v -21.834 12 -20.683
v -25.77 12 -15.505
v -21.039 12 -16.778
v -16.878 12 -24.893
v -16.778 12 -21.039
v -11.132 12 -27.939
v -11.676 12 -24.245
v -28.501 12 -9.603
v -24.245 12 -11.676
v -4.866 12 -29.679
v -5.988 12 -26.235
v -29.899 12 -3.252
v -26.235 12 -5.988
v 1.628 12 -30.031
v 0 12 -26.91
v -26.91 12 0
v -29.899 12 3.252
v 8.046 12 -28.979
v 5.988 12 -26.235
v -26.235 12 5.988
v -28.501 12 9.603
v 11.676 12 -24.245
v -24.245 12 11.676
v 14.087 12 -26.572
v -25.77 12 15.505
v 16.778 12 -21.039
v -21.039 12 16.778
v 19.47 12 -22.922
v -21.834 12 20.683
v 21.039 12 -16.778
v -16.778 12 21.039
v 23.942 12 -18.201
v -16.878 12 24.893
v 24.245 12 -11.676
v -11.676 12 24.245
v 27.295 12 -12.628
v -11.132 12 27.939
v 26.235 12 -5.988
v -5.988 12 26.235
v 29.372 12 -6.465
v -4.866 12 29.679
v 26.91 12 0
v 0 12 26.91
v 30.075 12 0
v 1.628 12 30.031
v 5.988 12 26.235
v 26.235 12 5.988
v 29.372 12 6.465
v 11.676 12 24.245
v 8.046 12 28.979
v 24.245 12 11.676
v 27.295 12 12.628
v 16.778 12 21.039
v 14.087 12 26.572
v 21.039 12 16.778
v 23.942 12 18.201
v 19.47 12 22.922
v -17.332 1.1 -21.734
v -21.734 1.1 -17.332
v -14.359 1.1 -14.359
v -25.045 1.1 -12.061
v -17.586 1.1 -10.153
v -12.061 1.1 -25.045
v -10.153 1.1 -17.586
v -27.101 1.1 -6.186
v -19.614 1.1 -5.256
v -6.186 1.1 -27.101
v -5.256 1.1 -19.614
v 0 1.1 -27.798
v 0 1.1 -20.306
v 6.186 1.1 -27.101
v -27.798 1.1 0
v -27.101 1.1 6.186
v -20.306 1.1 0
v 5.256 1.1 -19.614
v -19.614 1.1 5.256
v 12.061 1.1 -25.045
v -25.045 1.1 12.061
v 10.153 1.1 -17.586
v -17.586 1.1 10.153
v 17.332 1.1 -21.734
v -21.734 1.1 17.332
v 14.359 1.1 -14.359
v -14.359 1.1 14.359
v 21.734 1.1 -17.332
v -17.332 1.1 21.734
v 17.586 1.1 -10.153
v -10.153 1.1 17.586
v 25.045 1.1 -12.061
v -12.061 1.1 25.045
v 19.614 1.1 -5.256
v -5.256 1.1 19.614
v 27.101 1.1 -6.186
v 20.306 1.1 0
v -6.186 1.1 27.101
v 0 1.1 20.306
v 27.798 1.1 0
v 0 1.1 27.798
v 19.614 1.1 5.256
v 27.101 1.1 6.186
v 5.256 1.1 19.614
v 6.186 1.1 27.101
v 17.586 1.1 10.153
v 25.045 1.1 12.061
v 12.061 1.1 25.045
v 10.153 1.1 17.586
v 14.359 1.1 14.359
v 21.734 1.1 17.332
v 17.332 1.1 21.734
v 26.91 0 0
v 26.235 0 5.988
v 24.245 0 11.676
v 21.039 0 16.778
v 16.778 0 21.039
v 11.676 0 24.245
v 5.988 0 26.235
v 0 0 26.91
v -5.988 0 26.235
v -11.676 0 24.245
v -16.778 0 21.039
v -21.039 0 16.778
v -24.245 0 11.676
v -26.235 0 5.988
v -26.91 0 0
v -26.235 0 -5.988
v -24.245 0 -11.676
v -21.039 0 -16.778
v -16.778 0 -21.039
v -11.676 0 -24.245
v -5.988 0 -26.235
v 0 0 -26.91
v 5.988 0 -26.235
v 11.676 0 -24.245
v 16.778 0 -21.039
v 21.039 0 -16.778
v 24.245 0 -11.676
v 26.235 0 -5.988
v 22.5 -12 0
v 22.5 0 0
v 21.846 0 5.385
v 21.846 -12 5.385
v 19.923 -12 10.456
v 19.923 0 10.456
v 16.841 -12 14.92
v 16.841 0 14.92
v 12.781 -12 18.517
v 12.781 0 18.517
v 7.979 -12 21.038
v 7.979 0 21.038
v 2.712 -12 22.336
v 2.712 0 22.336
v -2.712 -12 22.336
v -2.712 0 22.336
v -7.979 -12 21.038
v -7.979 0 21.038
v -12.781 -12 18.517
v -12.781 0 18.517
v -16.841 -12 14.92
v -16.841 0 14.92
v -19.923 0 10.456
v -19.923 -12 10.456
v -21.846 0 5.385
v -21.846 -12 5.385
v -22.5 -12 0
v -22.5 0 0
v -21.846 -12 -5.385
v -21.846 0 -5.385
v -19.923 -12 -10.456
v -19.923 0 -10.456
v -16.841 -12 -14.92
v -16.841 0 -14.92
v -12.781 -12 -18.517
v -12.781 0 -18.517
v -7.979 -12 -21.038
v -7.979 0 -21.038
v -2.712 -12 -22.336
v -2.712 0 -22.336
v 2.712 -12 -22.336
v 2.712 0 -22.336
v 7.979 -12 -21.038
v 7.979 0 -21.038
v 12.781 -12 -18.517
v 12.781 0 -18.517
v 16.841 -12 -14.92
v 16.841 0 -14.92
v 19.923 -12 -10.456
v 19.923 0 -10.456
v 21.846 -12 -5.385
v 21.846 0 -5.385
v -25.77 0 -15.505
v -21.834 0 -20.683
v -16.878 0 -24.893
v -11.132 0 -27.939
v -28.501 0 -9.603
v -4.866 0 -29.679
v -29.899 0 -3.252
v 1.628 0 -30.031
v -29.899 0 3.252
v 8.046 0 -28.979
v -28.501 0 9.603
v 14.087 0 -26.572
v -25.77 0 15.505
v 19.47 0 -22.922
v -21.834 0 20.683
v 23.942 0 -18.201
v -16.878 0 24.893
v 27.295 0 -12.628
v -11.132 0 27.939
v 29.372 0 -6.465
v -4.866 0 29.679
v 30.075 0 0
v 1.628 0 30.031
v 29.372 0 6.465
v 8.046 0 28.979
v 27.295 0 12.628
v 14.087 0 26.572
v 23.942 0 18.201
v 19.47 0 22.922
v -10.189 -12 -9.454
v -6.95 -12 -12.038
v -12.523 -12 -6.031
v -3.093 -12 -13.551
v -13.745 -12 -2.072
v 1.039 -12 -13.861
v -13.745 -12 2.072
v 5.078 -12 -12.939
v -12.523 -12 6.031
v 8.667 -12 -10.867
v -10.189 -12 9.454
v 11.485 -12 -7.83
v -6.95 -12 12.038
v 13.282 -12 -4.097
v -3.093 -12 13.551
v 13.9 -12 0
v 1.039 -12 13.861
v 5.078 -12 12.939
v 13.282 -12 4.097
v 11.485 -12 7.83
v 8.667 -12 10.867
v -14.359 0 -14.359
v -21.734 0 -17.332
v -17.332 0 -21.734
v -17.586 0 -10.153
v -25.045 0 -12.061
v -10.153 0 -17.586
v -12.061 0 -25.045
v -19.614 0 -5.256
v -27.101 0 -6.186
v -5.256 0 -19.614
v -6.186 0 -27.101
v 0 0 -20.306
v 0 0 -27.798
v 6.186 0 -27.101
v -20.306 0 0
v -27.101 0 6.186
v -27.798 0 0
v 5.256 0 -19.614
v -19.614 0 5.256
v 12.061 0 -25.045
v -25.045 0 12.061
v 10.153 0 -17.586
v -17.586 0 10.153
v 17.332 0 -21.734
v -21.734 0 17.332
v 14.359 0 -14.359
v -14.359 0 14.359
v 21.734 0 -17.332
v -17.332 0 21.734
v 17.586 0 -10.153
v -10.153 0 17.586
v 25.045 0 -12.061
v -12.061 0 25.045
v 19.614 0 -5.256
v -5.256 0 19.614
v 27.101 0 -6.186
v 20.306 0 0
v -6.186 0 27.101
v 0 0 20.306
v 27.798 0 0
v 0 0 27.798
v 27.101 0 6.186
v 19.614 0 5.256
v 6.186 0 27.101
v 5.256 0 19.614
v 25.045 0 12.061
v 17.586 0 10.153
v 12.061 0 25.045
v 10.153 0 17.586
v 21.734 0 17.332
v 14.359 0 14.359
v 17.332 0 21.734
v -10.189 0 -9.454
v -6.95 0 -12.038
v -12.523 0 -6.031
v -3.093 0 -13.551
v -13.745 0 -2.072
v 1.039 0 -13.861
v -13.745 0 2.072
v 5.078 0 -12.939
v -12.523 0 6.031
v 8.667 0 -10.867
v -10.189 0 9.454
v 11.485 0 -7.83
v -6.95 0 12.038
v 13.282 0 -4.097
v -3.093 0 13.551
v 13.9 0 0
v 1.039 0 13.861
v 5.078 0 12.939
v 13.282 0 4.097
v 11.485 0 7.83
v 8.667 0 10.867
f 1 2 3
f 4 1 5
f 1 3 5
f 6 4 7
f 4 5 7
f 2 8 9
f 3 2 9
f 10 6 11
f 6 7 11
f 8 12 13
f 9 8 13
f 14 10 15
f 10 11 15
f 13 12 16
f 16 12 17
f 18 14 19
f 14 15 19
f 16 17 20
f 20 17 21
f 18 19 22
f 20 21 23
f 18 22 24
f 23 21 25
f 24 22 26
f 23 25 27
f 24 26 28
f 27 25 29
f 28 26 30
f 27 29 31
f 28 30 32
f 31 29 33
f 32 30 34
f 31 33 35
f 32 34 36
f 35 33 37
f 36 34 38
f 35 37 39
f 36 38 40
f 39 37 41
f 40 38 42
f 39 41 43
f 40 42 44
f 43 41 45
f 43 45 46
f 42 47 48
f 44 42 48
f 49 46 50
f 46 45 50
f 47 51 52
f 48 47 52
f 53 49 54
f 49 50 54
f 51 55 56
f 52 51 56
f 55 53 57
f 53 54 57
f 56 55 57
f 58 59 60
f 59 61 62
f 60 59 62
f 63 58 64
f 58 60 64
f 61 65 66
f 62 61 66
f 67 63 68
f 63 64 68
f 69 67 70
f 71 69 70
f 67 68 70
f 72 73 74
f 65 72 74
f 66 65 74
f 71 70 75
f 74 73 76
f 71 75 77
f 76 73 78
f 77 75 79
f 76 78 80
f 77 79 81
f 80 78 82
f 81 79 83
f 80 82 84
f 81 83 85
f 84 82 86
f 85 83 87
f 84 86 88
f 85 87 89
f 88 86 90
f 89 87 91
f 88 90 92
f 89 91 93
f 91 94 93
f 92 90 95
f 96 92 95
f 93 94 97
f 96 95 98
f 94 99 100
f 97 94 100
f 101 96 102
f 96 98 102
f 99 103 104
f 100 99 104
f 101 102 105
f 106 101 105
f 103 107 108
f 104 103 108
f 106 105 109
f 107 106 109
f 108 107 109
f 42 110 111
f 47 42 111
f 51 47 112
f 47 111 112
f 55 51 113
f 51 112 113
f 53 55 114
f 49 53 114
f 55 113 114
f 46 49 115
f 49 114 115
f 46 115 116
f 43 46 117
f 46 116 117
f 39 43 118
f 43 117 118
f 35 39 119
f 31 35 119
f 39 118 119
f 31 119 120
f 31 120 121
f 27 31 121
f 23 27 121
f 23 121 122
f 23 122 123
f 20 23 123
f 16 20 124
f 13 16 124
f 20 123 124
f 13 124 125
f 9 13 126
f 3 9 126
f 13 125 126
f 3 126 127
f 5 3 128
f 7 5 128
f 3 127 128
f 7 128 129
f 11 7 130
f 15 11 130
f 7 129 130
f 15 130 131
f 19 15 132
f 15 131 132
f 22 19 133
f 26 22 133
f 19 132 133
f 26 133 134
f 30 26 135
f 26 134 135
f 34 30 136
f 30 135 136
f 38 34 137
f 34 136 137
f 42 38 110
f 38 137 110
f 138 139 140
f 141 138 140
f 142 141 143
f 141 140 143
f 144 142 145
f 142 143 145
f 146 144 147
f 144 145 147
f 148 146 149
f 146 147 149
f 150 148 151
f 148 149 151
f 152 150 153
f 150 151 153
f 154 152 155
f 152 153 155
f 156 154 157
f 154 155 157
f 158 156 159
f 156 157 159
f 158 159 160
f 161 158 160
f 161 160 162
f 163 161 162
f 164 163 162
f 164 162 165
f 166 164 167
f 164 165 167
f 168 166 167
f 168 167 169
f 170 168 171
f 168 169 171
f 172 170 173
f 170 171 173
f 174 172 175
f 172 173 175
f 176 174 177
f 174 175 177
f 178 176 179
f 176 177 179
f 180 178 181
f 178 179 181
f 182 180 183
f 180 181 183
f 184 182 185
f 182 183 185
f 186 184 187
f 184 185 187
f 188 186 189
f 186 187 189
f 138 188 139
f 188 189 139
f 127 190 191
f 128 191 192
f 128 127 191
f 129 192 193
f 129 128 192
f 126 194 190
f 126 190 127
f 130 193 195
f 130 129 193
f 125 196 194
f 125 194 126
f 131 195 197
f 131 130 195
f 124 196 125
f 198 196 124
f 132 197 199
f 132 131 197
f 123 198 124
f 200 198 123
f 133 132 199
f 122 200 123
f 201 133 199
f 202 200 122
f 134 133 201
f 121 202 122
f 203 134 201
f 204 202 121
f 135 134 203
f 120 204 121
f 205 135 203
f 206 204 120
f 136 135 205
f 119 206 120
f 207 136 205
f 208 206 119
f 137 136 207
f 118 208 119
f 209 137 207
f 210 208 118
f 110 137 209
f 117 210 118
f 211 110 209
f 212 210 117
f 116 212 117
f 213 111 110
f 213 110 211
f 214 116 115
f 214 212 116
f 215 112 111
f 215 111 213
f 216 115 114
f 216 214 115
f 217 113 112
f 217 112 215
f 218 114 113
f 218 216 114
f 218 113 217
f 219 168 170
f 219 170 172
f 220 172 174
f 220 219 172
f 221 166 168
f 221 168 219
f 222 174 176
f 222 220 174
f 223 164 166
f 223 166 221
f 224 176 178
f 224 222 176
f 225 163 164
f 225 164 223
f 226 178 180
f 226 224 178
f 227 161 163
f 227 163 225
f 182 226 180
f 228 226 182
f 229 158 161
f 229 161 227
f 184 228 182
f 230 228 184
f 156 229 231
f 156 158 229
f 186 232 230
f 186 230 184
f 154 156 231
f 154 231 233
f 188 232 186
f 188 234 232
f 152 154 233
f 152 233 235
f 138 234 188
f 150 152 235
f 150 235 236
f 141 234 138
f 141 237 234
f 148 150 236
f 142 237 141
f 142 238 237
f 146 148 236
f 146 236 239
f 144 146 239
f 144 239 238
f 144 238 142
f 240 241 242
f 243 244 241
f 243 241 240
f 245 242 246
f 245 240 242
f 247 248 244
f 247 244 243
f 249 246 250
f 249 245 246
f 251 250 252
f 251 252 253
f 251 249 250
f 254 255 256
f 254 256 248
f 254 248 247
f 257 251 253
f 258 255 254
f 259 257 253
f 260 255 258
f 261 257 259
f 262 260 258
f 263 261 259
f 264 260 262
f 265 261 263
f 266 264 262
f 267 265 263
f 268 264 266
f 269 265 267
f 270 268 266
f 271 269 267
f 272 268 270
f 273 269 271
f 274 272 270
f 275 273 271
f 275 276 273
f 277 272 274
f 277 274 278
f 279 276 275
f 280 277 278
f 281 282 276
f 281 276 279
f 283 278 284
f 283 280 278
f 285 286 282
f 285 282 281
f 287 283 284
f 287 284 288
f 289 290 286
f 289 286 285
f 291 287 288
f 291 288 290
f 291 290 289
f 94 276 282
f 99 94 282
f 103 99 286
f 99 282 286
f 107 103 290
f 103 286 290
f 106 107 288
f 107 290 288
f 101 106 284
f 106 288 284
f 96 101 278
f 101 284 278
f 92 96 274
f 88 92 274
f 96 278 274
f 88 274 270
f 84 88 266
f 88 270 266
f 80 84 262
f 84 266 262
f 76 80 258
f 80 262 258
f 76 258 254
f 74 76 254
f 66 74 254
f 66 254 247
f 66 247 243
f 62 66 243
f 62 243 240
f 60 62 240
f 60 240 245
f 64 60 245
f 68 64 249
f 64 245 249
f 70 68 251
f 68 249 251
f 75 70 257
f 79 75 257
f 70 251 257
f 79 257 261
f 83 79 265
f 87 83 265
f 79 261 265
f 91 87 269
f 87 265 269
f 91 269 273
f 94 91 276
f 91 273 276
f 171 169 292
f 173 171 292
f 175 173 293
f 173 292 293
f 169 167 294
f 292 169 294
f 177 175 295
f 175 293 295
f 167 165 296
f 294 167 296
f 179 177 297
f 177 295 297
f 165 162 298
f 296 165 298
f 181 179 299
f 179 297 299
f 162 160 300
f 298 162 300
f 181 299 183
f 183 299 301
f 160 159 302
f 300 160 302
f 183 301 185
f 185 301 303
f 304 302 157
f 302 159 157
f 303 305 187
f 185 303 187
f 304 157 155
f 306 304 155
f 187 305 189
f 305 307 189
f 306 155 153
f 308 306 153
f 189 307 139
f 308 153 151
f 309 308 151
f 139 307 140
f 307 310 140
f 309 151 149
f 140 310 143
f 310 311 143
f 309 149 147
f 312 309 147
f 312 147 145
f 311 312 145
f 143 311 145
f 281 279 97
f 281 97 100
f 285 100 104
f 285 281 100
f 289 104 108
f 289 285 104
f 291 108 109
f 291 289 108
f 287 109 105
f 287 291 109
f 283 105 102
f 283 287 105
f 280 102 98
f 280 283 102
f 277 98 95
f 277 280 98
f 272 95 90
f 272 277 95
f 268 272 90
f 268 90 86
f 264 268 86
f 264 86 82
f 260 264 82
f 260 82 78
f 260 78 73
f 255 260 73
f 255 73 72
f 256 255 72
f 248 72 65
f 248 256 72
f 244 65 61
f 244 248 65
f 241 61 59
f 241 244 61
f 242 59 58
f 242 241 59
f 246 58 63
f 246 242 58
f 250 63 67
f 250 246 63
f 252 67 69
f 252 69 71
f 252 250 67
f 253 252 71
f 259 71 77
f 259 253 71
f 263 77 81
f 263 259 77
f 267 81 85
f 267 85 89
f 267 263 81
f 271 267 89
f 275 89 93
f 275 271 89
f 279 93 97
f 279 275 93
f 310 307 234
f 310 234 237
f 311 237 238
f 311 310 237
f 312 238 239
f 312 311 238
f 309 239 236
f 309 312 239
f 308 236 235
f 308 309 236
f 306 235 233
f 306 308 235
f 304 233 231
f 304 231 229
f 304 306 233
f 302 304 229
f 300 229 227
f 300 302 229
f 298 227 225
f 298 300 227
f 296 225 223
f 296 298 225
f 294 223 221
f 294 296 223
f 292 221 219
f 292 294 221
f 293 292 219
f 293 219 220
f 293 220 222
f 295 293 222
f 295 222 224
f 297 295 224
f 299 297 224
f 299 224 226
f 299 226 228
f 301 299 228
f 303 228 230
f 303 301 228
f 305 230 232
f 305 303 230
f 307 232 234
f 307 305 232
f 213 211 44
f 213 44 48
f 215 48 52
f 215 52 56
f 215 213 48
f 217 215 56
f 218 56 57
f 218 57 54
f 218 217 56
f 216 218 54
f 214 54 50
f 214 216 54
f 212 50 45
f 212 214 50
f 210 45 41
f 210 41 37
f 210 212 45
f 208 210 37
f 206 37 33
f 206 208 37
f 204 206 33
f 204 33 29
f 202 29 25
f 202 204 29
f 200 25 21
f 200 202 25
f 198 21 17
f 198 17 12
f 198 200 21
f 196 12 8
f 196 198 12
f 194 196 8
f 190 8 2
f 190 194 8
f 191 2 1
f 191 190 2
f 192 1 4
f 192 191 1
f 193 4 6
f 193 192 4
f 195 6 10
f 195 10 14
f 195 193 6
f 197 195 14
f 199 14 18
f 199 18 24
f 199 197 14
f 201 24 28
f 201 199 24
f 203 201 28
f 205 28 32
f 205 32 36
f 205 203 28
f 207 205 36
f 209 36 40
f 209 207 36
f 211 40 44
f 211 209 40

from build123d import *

# Parameters (mm, degrees)
F0_R     = 22.5
F0_R_2   = 13.9
F1_DEPTH = 12
F2_R     = 30.075
F2_R_2   = 26.91
F3_DEPTH = 12
F4_R     = 27.798297
F4_R_2   = 20.30632
F5_DEPTH = 1.1


with BuildPart() as f1:
    # F0 (on Front) → F1 (new body)
    with BuildSketch(Plane.XZ):
        Circle(F0_R)
        Circle(F0_R_2, mode=Mode.SUBTRACT)
    extrude(amount=F1_DEPTH)


with BuildPart() as f3:
    # F2 (on Front) → F3 (new body)
    with BuildSketch(Plane.XZ):
        Circle(F2_R)
        Circle(F2_R_2, mode=Mode.SUBTRACT)
    extrude(amount=-F3_DEPTH)


with BuildPart() as f5:
    # F4 (on Front) → F5 (new body)
    with BuildSketch(Plane.XZ):
        Circle(F4_R)
        Circle(F4_R_2, mode=Mode.SUBTRACT)
    extrude(amount=-F5_DEPTH)


solid = Compound([f1.part, f3.part, f5.part])
